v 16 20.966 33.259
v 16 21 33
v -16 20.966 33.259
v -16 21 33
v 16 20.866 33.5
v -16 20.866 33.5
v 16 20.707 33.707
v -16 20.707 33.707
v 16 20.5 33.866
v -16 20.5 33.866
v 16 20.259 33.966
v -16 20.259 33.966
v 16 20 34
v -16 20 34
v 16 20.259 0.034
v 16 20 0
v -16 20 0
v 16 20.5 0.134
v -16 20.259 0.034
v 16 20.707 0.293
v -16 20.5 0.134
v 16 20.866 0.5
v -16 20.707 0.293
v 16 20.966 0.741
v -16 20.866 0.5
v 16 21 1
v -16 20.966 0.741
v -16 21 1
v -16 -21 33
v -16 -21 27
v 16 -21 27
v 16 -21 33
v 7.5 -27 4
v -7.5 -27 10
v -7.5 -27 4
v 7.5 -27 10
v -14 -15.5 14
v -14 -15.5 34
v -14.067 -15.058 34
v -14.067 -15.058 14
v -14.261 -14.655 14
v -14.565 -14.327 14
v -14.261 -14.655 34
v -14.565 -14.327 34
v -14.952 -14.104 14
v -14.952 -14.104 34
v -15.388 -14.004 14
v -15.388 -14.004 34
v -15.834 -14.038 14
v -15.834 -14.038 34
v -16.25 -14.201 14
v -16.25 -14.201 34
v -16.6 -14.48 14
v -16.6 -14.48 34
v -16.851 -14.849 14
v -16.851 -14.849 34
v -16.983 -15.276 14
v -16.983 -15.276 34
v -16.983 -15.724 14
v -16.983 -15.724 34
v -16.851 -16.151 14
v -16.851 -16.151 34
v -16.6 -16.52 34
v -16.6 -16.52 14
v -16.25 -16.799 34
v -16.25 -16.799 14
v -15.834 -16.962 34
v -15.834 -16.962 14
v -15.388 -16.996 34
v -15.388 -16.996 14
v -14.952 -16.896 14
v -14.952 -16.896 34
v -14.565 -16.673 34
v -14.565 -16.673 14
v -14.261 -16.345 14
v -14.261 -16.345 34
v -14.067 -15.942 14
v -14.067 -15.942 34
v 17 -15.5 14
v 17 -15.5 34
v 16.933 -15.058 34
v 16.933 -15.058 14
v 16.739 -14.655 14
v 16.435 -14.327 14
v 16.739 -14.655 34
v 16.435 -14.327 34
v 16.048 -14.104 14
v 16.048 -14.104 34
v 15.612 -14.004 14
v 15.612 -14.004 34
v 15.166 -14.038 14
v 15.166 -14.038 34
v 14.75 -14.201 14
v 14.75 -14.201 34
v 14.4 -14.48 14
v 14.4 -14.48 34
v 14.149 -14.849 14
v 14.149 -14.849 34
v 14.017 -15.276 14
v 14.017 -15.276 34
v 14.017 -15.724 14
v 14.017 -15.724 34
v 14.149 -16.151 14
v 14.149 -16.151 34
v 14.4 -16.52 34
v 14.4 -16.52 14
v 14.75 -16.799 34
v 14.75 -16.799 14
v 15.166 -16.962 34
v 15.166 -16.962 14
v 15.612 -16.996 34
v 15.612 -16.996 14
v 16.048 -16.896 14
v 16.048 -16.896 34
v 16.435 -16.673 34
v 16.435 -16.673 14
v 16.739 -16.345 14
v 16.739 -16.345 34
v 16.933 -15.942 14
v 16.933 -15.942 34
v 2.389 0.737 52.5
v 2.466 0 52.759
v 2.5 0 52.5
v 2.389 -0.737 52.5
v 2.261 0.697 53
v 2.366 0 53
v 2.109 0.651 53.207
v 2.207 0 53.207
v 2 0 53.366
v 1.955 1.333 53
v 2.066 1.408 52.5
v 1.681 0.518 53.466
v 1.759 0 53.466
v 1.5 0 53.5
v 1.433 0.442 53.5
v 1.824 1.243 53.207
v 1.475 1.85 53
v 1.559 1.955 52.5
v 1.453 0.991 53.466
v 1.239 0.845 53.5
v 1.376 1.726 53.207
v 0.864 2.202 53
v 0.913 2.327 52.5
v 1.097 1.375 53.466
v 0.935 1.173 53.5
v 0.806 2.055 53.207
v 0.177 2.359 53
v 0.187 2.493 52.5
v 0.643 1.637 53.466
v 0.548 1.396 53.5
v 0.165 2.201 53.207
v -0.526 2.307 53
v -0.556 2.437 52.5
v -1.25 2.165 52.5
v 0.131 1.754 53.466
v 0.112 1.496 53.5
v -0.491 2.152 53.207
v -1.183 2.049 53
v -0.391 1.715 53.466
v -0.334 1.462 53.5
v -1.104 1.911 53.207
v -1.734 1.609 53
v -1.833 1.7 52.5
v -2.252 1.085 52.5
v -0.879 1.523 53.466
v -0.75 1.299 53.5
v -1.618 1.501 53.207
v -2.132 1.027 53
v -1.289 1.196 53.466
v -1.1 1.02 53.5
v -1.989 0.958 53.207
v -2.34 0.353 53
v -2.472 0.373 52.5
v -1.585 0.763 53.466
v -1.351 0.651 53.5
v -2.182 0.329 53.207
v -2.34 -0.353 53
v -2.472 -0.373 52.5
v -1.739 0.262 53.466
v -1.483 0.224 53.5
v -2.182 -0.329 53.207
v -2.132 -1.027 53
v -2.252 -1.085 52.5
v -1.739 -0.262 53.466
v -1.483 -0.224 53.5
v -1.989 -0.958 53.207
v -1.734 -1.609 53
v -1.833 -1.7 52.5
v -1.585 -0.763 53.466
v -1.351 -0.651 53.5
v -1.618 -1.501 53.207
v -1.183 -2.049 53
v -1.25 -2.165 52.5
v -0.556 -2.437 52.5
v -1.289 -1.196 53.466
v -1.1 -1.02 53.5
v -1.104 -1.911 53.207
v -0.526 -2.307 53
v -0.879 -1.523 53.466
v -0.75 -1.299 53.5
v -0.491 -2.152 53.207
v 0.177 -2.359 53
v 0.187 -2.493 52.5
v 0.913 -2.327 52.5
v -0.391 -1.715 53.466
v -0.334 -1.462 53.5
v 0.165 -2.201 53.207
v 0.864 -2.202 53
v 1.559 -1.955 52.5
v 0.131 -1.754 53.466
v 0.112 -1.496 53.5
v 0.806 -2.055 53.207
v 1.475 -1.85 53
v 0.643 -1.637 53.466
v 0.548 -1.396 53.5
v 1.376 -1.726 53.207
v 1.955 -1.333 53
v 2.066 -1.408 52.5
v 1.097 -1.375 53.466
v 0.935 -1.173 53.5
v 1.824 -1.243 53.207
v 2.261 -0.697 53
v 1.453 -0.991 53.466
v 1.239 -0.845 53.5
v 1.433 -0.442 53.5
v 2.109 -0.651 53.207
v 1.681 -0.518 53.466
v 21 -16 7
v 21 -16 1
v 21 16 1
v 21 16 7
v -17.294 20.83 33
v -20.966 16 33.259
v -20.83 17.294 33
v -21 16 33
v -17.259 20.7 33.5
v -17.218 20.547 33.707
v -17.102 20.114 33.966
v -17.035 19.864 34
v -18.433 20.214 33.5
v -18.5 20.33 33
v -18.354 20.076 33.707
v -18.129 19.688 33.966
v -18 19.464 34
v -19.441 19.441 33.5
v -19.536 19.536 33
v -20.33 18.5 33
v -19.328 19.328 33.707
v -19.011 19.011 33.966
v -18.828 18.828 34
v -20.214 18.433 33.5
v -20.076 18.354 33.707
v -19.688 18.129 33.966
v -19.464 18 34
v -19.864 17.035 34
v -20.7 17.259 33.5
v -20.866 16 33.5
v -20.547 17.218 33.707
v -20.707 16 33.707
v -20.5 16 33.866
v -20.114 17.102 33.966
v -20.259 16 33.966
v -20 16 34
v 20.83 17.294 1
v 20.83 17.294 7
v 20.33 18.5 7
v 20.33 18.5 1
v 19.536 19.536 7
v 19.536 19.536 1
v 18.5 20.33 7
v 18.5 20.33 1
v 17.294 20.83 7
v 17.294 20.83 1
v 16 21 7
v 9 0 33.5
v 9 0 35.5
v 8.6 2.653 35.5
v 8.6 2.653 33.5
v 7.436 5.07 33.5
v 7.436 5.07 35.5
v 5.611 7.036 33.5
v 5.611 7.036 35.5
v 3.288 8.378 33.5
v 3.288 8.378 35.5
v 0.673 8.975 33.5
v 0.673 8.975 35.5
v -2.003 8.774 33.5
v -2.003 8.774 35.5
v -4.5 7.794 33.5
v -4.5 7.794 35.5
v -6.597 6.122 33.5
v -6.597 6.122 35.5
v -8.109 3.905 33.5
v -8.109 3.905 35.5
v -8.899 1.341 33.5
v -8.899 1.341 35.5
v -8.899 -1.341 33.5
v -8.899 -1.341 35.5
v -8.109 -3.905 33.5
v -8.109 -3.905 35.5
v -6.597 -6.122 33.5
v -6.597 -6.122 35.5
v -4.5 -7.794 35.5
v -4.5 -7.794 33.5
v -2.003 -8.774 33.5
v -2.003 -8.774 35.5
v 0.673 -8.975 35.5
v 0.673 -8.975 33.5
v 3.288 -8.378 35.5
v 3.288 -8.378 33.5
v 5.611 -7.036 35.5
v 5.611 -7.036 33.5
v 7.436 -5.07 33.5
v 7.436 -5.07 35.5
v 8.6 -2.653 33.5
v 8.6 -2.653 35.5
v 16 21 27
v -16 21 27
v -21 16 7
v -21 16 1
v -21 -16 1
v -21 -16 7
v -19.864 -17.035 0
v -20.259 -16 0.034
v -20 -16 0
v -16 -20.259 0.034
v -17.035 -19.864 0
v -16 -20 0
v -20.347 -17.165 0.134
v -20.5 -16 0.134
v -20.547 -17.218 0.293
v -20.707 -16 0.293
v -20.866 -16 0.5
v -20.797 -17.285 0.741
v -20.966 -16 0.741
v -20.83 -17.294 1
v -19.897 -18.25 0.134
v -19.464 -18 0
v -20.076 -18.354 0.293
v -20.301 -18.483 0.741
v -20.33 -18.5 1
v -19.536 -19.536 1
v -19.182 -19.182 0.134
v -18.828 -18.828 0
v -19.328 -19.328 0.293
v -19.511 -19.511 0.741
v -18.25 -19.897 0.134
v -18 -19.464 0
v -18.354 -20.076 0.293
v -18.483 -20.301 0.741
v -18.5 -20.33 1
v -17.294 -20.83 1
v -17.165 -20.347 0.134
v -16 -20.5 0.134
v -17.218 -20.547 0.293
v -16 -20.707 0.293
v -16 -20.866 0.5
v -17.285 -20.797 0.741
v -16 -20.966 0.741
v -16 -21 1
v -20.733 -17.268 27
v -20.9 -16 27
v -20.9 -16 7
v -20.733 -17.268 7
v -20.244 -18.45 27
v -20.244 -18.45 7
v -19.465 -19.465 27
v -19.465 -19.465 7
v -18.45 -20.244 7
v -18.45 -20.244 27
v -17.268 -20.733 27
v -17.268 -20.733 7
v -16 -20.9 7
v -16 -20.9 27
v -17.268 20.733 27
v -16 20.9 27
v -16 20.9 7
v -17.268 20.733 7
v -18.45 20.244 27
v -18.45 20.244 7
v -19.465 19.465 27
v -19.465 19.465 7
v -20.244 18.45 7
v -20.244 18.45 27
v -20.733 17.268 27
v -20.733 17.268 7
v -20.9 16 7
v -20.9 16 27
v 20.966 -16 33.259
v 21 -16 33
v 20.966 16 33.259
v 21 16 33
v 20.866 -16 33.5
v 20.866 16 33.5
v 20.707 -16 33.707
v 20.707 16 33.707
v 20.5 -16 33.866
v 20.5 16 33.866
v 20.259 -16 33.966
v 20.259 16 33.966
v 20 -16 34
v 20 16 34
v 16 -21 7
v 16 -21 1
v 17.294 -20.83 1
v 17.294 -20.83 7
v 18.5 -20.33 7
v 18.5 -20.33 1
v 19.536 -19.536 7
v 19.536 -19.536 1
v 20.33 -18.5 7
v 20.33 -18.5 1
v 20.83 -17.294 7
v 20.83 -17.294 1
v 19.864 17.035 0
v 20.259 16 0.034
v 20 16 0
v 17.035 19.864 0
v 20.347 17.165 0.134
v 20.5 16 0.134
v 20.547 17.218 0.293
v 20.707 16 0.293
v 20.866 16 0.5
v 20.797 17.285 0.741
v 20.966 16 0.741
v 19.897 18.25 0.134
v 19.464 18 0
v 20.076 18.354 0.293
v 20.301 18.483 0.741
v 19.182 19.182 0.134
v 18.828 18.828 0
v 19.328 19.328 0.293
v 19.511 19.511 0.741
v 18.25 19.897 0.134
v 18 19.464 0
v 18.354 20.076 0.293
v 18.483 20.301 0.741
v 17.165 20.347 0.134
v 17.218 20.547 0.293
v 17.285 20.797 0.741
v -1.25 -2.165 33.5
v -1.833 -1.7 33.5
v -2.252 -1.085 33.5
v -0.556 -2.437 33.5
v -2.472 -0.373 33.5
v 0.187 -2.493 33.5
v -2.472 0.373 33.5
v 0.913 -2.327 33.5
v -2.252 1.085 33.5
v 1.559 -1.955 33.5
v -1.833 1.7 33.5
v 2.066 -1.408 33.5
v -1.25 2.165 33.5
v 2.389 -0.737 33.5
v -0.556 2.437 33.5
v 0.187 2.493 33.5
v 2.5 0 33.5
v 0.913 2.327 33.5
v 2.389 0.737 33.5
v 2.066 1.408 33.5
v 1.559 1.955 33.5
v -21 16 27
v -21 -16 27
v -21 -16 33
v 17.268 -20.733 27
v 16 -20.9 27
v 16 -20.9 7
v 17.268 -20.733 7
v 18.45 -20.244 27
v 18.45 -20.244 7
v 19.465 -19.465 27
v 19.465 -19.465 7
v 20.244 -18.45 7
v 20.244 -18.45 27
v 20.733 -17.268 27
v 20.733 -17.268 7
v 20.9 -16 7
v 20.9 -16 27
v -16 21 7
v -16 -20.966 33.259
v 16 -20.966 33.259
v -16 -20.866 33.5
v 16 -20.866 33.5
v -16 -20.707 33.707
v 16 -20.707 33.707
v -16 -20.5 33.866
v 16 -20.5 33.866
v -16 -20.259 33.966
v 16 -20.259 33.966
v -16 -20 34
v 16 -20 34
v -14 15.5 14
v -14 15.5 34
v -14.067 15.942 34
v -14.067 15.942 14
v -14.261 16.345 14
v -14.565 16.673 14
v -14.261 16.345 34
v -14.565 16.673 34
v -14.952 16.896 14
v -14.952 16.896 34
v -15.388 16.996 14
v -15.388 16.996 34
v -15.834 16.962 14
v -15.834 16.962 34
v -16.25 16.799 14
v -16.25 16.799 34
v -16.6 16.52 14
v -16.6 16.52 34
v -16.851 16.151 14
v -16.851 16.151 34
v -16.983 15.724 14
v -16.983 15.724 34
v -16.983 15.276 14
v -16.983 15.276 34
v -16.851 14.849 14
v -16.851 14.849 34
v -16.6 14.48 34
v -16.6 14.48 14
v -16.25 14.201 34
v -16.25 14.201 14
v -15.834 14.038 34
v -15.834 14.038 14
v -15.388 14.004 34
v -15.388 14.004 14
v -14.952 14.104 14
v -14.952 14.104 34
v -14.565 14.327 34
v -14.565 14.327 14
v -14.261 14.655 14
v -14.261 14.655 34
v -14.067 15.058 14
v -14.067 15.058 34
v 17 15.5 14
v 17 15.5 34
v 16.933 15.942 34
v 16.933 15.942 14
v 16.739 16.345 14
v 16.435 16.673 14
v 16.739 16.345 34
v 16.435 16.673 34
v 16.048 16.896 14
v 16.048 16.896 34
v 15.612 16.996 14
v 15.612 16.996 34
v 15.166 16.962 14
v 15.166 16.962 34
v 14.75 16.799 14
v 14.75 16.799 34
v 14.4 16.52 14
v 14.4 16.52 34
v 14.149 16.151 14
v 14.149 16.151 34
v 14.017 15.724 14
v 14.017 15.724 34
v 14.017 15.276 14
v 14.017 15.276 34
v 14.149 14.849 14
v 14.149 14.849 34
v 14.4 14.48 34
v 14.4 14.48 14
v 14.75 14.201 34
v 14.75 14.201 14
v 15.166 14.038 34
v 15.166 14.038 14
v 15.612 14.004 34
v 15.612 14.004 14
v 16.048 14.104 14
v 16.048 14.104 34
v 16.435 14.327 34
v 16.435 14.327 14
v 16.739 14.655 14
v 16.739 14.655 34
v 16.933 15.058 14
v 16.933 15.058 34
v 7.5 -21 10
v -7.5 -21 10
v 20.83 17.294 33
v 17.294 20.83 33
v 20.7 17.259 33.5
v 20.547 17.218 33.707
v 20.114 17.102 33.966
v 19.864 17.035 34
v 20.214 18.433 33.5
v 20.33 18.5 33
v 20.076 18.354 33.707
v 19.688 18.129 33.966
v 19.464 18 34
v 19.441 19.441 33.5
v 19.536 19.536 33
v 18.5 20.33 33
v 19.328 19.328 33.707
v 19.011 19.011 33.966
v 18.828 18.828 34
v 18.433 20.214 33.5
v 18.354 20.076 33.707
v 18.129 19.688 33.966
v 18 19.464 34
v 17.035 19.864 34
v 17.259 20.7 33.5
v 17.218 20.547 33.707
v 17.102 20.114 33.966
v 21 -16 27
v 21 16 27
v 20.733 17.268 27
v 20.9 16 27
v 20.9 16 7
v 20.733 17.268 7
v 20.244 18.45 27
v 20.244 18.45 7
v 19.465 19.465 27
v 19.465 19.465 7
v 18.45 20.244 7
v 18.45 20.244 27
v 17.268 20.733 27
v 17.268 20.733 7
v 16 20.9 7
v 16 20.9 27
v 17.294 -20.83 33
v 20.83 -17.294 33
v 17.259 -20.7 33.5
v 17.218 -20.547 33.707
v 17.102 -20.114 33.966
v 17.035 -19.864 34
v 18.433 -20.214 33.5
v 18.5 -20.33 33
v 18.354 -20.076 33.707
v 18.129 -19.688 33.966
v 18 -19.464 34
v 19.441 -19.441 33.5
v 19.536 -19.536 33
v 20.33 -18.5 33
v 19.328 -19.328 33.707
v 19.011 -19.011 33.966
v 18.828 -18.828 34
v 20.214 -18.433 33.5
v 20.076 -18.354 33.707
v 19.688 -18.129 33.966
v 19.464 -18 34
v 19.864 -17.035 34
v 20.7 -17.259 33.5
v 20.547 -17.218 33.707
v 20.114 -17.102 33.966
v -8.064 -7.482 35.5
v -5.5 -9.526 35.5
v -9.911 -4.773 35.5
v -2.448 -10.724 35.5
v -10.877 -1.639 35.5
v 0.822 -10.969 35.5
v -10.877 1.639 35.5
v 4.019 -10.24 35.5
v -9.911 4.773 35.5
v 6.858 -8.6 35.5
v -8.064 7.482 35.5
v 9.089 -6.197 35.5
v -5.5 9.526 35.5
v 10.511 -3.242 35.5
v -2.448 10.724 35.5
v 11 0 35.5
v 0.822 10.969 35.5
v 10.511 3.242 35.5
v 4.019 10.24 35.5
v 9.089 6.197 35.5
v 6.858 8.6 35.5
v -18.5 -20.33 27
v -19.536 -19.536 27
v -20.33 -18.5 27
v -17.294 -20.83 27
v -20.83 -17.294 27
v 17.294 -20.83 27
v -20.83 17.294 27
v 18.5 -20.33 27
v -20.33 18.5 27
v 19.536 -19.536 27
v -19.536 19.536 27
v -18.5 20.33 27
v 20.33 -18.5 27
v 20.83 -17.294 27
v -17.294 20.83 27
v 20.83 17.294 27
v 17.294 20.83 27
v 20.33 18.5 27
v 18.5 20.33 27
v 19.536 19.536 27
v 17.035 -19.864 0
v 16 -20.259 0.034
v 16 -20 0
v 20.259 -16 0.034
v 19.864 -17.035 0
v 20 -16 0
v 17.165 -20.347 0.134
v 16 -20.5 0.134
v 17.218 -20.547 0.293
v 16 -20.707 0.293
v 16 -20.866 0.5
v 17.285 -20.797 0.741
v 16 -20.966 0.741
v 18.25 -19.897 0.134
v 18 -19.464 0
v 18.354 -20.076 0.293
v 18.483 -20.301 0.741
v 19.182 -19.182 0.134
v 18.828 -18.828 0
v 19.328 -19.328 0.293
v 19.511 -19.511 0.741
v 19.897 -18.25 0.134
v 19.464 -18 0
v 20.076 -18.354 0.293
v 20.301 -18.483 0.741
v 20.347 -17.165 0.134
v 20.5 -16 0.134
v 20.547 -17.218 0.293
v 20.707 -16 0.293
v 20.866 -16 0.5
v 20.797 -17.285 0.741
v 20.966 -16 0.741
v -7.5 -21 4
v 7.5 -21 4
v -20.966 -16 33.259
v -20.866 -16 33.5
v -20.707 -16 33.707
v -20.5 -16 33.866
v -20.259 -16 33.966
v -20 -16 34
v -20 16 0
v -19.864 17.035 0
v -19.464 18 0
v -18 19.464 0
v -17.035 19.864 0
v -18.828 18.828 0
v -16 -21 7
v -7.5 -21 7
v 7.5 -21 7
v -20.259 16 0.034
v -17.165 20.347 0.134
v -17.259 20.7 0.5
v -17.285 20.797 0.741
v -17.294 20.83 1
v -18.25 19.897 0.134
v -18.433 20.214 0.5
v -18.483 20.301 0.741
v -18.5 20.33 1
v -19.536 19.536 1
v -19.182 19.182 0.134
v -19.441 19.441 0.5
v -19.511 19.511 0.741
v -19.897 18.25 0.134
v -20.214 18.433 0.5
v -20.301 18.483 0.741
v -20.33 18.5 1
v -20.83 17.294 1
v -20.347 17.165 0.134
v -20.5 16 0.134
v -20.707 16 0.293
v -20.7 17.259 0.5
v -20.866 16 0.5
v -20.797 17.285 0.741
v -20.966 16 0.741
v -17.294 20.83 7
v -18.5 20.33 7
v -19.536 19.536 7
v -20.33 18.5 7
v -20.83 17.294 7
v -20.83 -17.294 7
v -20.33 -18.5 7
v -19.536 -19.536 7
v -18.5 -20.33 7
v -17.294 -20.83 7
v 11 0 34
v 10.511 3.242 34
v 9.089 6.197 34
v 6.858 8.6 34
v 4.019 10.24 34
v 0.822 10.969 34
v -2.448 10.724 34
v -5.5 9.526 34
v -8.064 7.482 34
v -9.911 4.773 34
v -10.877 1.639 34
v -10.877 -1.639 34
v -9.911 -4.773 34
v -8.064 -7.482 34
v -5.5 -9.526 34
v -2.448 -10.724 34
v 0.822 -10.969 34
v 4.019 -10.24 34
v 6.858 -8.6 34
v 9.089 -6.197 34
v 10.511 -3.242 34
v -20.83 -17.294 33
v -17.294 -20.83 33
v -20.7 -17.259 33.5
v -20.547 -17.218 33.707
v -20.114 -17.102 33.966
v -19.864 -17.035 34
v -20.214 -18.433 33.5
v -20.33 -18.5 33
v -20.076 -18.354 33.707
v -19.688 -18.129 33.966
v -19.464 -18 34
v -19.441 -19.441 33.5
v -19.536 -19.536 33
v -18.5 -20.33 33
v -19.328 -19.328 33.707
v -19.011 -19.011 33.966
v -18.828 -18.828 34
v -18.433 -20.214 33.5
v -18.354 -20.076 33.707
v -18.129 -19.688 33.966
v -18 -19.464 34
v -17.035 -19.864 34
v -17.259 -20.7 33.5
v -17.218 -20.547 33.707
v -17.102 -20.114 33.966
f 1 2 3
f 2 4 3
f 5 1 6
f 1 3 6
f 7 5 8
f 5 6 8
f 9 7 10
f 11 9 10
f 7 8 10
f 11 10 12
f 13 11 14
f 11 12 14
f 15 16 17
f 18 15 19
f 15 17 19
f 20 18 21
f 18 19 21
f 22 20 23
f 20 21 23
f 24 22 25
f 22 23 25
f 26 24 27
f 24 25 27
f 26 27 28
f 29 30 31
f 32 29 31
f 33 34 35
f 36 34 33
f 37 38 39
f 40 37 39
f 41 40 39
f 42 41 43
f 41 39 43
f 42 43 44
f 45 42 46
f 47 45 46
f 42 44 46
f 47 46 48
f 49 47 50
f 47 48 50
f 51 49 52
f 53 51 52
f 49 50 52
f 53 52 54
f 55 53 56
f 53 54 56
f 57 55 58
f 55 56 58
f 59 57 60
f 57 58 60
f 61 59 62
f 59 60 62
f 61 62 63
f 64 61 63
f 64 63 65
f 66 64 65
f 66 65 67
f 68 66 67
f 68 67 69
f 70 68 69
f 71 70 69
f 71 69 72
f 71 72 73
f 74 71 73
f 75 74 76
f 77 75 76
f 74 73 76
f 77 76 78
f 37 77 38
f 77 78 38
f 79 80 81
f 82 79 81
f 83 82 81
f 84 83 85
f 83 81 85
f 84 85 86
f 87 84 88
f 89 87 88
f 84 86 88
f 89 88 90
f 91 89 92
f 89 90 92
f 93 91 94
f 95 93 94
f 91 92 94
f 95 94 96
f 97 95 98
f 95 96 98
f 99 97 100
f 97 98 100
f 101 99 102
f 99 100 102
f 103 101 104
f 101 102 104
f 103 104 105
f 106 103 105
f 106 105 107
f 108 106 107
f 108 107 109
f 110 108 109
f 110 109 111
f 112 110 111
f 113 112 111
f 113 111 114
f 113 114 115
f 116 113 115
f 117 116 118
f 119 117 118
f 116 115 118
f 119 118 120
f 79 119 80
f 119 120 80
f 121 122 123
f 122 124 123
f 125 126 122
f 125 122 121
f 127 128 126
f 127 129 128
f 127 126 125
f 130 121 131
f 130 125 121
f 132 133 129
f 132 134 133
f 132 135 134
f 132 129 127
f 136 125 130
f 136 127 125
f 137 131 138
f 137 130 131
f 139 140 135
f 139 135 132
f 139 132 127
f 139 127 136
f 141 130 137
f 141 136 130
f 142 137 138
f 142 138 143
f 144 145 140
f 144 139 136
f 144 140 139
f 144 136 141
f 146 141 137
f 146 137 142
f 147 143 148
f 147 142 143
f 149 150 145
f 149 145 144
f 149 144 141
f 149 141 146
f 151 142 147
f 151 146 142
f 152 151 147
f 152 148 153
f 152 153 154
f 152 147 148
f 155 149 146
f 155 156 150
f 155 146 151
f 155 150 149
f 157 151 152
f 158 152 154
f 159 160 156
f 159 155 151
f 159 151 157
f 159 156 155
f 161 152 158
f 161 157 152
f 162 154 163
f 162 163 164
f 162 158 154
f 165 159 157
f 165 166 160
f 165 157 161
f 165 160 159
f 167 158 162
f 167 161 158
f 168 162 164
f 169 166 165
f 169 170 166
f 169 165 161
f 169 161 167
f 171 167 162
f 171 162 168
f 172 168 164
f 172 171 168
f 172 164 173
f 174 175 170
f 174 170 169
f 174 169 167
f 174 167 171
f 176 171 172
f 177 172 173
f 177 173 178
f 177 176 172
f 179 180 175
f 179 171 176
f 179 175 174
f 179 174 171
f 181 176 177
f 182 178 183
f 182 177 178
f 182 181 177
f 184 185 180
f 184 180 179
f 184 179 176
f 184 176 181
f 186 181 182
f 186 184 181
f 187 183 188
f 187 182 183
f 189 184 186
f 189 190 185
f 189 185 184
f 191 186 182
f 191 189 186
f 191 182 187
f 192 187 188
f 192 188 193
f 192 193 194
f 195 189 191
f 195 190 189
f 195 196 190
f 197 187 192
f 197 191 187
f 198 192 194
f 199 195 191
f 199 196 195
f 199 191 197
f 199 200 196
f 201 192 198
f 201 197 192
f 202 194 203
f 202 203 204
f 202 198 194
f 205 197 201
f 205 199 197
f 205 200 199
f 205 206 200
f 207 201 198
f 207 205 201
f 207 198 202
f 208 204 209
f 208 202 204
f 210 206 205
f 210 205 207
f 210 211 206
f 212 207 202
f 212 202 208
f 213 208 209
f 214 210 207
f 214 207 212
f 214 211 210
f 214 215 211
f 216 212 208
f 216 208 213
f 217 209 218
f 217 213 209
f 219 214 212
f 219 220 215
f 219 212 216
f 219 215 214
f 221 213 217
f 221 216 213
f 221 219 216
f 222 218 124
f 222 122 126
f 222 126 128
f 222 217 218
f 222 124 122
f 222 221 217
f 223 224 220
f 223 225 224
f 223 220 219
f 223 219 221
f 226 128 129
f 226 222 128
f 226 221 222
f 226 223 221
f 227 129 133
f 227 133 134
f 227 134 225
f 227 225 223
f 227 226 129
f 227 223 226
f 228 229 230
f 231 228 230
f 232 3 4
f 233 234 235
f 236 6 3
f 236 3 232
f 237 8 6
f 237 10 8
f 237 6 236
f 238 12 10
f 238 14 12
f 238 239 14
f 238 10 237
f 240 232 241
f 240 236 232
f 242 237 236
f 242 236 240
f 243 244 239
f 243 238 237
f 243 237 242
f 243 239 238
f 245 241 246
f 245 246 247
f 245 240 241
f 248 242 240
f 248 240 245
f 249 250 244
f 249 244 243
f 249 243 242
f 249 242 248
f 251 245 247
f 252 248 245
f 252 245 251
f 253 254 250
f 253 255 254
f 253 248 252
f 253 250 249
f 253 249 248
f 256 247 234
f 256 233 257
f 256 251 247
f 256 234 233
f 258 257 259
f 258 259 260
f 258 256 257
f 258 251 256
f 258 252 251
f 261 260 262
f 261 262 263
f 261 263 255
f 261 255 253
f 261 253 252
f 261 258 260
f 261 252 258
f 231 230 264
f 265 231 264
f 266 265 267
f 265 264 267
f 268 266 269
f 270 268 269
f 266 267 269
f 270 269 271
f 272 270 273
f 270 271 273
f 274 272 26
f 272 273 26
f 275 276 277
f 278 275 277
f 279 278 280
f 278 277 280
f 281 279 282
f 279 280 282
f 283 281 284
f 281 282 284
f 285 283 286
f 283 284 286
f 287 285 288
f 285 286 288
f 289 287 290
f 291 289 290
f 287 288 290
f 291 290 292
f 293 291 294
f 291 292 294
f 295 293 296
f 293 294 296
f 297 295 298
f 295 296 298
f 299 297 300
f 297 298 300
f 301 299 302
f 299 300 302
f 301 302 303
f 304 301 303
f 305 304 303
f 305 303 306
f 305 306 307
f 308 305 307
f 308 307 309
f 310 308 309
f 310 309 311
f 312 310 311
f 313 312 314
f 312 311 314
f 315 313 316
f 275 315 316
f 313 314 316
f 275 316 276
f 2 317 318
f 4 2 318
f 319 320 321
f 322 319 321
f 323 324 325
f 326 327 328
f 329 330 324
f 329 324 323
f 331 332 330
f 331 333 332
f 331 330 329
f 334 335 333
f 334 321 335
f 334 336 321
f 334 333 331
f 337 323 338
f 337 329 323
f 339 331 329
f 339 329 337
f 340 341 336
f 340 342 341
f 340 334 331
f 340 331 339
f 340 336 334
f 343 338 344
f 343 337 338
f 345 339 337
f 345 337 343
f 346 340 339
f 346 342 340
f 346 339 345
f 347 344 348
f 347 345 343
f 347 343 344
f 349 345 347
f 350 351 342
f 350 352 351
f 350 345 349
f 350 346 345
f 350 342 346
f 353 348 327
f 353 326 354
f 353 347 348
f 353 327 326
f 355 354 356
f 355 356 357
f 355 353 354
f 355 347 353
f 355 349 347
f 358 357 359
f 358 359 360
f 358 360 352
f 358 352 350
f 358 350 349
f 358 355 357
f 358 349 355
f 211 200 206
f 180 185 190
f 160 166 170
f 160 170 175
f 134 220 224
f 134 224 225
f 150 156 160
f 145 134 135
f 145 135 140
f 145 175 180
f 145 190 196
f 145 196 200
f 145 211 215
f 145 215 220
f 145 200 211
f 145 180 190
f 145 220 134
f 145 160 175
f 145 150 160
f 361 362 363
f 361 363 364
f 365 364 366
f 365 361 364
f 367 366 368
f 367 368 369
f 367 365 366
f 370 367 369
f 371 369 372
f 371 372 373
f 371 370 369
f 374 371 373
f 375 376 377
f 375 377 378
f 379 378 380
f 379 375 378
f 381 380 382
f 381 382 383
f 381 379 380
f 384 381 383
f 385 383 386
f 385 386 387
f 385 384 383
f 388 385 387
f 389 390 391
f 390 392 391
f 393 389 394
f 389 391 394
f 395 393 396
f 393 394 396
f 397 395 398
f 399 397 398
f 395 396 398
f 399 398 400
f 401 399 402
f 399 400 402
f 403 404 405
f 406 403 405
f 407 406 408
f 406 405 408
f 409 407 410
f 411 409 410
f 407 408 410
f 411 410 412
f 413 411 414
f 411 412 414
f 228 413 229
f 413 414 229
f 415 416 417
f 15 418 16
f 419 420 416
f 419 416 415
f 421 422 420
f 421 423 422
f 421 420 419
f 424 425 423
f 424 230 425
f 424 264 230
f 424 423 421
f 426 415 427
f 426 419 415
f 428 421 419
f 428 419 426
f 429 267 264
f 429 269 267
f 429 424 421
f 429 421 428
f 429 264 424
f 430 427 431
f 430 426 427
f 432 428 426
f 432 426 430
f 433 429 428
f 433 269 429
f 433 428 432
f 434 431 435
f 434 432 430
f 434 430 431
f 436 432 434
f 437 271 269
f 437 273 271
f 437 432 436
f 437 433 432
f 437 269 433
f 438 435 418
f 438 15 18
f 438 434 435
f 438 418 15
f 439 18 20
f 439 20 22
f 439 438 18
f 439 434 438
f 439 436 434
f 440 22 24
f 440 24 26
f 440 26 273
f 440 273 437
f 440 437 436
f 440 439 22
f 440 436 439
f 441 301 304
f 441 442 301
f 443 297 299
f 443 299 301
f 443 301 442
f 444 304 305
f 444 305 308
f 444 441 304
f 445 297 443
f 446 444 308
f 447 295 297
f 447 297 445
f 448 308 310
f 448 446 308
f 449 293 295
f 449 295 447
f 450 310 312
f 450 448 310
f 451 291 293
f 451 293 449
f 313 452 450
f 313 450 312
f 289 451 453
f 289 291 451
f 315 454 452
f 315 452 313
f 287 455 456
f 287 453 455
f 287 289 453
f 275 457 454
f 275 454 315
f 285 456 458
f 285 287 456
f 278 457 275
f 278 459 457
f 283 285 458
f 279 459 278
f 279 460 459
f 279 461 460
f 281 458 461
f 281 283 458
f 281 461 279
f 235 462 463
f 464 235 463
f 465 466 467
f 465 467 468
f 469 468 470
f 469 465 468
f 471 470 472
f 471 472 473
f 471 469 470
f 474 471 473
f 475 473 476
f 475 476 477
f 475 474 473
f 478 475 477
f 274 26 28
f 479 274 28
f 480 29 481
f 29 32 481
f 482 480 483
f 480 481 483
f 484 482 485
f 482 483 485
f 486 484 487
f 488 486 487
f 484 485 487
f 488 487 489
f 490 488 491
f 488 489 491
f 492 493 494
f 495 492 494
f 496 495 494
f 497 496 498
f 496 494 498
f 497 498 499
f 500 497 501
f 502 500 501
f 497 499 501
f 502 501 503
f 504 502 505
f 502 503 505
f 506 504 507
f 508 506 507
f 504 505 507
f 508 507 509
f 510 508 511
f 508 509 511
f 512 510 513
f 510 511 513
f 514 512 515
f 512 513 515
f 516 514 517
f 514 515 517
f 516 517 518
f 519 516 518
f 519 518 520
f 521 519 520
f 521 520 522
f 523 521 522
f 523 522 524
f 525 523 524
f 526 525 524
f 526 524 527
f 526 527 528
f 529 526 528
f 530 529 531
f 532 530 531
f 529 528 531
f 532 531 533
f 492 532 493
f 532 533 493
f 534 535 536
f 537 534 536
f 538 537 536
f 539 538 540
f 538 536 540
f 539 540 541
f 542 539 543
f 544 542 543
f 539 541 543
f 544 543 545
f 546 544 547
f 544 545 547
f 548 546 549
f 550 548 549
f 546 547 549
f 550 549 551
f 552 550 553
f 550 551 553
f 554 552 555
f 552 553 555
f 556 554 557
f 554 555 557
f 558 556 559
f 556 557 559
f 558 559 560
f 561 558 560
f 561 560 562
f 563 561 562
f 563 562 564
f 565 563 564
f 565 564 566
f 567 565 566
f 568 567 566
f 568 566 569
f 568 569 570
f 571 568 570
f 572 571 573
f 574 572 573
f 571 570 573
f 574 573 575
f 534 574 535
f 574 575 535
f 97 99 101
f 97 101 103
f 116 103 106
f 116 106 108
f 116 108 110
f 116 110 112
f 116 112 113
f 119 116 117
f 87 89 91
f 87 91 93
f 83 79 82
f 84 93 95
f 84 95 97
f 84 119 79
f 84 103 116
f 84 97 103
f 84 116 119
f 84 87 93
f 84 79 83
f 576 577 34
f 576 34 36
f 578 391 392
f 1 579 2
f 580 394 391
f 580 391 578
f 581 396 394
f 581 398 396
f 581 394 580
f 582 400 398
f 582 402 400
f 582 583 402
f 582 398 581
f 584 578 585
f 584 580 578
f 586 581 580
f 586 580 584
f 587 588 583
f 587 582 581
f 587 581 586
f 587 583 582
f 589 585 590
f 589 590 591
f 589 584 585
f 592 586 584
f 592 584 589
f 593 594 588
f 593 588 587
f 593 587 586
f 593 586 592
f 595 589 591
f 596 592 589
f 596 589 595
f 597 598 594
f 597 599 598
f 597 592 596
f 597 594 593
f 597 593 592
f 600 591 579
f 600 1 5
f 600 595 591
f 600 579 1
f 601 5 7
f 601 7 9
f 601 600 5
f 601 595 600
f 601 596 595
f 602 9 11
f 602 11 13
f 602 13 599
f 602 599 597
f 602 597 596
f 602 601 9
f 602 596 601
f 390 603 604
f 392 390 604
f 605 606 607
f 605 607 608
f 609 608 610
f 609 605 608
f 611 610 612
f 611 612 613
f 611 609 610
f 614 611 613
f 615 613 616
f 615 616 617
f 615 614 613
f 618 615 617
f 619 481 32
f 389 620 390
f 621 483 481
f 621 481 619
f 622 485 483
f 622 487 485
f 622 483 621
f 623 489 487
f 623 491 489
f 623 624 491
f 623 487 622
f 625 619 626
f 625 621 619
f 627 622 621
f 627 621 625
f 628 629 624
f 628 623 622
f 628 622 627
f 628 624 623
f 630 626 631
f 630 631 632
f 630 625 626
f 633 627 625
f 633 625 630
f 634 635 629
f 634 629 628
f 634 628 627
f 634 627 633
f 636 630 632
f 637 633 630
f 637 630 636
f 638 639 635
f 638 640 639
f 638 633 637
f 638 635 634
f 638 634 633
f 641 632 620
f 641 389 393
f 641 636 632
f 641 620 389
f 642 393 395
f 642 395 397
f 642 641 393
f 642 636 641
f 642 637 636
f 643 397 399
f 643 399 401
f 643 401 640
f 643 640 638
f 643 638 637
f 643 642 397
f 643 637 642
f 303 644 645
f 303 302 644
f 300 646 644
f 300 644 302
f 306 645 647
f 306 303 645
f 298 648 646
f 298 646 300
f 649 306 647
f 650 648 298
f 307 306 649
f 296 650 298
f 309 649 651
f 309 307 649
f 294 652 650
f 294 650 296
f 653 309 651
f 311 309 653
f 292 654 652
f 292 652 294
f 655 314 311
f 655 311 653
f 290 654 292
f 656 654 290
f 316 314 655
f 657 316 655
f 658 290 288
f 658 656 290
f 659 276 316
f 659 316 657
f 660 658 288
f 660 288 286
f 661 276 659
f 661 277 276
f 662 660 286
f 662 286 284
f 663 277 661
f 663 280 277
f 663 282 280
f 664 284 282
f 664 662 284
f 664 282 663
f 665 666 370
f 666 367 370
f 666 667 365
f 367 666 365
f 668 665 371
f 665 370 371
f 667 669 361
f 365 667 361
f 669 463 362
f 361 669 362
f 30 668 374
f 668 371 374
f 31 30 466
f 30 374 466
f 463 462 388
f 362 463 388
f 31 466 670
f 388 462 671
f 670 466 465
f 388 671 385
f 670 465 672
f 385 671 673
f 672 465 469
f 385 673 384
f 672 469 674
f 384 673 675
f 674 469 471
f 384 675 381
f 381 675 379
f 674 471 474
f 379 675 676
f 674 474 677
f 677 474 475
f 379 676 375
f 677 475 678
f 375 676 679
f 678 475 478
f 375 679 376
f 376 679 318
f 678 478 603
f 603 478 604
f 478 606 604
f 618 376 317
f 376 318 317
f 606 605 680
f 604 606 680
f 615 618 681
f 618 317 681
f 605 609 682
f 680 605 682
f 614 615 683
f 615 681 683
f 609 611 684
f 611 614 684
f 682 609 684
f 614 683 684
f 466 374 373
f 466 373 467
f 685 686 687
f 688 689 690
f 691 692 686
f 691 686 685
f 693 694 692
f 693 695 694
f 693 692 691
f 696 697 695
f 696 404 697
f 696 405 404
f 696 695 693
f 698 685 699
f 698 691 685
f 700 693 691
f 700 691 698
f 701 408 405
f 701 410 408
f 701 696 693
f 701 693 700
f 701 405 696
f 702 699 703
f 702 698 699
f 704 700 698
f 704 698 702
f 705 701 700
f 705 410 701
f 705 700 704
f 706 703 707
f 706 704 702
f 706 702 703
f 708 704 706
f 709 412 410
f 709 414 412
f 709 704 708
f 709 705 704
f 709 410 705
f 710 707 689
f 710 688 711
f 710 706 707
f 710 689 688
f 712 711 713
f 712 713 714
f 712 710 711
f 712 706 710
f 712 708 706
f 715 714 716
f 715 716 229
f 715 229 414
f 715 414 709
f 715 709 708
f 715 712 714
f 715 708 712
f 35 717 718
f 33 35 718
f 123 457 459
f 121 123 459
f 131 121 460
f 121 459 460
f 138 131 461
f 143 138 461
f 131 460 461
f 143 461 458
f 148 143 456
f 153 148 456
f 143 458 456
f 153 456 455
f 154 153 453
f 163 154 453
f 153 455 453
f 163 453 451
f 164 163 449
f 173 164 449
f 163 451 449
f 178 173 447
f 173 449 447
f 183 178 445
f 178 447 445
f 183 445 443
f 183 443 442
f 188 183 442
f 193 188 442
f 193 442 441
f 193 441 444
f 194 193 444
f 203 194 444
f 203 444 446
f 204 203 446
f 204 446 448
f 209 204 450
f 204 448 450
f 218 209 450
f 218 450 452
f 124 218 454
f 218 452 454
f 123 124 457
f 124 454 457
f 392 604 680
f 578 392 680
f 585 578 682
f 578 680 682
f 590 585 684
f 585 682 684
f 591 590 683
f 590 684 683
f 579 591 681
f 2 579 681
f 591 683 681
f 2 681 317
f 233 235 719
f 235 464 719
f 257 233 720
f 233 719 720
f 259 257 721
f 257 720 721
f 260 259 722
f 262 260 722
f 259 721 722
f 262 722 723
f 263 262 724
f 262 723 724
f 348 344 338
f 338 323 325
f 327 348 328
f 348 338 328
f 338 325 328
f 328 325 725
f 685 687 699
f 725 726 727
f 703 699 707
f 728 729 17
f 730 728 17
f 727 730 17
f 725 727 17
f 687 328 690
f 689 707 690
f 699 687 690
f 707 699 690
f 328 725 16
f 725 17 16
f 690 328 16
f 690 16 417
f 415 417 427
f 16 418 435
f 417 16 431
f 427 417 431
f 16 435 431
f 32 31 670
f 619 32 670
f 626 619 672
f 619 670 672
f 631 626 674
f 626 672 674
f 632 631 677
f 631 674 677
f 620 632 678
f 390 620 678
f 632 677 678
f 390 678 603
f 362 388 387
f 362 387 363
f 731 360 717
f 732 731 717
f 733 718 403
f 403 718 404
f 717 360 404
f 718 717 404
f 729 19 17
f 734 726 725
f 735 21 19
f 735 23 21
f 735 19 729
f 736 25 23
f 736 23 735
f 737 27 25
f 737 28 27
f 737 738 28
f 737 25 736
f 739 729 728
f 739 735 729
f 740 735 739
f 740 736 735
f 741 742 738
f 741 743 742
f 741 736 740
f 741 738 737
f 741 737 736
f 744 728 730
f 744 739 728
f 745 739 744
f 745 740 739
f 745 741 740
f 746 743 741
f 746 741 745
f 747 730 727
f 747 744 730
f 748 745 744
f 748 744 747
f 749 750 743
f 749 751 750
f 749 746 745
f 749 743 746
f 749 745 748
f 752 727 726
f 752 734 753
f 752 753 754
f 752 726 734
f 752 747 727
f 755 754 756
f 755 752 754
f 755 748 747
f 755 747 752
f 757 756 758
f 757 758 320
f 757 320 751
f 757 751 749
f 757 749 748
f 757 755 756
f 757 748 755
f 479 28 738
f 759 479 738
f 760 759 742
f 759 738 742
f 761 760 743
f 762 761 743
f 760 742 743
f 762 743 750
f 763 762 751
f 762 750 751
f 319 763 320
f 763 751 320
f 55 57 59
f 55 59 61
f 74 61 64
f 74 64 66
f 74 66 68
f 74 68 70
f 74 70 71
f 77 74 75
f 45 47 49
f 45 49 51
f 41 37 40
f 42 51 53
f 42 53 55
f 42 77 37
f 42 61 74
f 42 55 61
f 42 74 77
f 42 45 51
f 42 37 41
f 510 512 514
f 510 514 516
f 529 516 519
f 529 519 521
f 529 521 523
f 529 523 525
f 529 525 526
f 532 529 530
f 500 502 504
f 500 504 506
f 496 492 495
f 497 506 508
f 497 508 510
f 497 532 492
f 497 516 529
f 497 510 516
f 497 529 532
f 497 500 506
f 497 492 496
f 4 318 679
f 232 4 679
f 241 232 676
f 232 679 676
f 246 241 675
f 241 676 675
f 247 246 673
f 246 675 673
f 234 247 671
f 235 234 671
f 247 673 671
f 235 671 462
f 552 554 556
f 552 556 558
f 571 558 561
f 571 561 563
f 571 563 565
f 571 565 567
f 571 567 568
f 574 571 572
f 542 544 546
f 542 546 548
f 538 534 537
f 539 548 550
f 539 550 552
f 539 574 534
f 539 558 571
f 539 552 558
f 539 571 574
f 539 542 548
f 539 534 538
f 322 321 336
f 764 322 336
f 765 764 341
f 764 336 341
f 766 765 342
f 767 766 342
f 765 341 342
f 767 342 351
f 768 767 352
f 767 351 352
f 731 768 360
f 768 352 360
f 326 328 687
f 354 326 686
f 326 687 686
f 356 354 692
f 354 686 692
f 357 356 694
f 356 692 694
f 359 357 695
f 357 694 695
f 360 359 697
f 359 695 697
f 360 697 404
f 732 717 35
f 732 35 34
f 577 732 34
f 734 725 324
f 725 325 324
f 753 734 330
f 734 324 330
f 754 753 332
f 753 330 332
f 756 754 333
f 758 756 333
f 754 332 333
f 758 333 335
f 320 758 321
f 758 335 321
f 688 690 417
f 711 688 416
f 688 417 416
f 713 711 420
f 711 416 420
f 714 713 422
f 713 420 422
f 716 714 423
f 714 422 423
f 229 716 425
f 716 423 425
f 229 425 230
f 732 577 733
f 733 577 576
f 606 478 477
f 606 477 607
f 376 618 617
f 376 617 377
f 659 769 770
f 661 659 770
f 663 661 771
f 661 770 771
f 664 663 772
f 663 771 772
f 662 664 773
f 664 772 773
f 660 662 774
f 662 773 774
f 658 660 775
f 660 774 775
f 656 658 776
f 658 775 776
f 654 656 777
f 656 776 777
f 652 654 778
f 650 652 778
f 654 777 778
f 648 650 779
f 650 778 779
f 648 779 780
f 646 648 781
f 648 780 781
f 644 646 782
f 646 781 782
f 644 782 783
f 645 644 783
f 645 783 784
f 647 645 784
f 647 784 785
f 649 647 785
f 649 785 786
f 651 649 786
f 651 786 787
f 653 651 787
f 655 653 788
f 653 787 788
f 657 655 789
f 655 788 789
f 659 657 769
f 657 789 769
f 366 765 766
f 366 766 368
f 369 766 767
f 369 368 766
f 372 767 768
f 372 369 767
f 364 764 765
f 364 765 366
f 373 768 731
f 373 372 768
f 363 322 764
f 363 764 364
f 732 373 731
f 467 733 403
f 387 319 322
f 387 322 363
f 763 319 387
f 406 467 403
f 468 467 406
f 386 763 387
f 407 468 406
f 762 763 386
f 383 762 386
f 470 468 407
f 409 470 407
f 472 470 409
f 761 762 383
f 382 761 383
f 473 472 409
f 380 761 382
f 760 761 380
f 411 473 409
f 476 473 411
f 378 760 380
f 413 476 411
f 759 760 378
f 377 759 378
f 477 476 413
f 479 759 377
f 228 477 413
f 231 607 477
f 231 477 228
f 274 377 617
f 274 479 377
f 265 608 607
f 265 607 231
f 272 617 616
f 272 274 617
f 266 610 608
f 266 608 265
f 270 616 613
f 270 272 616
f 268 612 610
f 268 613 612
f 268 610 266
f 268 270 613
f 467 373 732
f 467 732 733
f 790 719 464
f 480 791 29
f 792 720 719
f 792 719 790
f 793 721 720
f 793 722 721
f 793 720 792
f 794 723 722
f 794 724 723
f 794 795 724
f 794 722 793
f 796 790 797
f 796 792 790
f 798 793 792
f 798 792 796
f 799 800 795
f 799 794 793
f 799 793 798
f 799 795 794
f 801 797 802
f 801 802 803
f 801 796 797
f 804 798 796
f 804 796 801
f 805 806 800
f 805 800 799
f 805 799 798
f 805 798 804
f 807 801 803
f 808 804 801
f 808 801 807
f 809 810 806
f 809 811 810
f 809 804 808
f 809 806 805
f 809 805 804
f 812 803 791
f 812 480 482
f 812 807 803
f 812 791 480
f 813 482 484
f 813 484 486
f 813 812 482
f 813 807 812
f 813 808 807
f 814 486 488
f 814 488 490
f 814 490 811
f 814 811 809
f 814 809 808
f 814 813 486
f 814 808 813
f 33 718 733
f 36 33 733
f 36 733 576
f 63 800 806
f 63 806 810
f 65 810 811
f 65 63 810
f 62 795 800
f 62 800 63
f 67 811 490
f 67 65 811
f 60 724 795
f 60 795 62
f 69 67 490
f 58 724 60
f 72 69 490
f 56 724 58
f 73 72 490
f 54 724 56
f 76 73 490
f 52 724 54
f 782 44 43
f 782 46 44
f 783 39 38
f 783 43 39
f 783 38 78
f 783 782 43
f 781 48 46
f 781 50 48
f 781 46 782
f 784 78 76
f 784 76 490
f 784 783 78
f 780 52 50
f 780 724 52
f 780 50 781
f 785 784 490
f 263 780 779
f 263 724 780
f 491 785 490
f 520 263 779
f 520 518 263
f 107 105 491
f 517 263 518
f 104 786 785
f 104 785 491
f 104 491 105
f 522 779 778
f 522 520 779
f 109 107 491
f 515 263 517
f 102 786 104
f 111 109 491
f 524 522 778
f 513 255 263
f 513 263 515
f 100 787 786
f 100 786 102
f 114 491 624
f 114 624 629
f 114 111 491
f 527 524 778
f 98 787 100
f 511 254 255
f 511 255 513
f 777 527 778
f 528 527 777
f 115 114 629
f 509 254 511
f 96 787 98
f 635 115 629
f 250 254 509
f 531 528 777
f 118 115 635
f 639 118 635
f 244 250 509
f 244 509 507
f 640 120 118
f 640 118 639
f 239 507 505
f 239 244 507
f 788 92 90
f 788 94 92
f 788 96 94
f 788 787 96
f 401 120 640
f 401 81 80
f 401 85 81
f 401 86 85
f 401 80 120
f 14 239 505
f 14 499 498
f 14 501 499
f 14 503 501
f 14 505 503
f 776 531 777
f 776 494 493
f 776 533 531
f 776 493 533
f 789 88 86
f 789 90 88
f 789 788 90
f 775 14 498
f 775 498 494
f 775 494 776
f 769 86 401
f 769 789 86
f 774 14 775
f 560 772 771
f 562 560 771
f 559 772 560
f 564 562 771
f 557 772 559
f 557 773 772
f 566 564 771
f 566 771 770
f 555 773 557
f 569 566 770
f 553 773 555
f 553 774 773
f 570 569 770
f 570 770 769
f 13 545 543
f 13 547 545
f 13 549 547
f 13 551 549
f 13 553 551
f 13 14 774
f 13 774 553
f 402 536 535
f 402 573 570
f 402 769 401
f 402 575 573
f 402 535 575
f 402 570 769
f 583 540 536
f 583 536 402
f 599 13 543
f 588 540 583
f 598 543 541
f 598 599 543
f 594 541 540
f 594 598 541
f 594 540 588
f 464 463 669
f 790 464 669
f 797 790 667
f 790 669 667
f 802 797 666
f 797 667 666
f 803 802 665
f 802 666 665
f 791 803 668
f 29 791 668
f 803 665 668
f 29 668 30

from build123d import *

# Parameters (mm, degrees)
BOSS_EXTRUDE1_DEPTH = 34
SKETCH4_R           = 11
BOSS_EXTRUDE2_DEPTH = 1.5
SKETCH5_W           = 15
SKETCH5_H           = 6
BOSS_EXTRUDE3_DEPTH = 6
SKETCH6_R           = 9
CUT_EXTRUDE1_DEPTH  = 2
SKETCH7_R           = 2.5
BOSS_EXTRUDE4_DEPTH = 20
CUT_EXTRUDE3_DEPTH  = 20
FILLET1_R           = 1
FILLET2_R           = 1
SKETCH9_R           = 1.5
CUT_EXTRUDE4_DEPTH  = 20


with BuildPart() as part:
    # Sketch2 → Boss-Extrude1 (new body)
    with BuildSketch(Plane.XY):
        with BuildLine():
            Line((-16, -21), (16, -21))
            ThreePointArc((16, -21), (19.535533906, -19.535533906), (21, -16))
            Line((21, -16), (21, 16))
            ThreePointArc((21, 16), (19.535533906, 19.535533906), (16, 21))
            Line((16, 21), (-16, 21))
            ThreePointArc((-16, 21), (-19.535533906, 19.535533906), (-21, 16))
            Line((-21, 16), (-21, -16))
            ThreePointArc((-21, -16), (-19.535533906, -19.535533906), (-16, -21))
        make_face()
    extrude(amount=BOSS_EXTRUDE1_DEPTH)

    # Sketch4 → Boss-Extrude2 (add)
    with BuildSketch(Plane.XY.offset(34)):
        Circle(SKETCH4_R)
    extrude(amount=BOSS_EXTRUDE2_DEPTH)

    # Sketch5 → Boss-Extrude3 (add)
    with BuildSketch(Plane.XZ.offset(21)):
        with Locations((0, 7)):
            Rectangle(SKETCH5_W, SKETCH5_H)
    extrude(amount=BOSS_EXTRUDE3_DEPTH)

    # Sketch6 → Cut-Extrude1 (cut)
    with BuildSketch(Plane.XY.offset(35.5)):
        Circle(SKETCH6_R)
    extrude(amount=-CUT_EXTRUDE1_DEPTH, mode=Mode.SUBTRACT)

    # Sketch7 → Boss-Extrude4 (add)
    with BuildSketch(Plane.XY.offset(33.5)):
        Circle(SKETCH7_R)
    extrude(amount=BOSS_EXTRUDE4_DEPTH)

    # Sketch8 → Cut-Extrude3 (cut)
    with BuildSketch(Plane.XY.offset(27)):
        with BuildLine():
            Line((16, 21), (-16, 21))
            ThreePointArc((-16, 21), (-19.535533906, 19.535533906), (-21, 16))
            Line((-21, 16), (-21, -16))
            ThreePointArc((-21, -16), (-19.535533906, -19.535533906), (-16, -21))
            Line((-16, -21), (16, -21))
            ThreePointArc((16, -21), (19.535533906, -19.535533906), (21, -16))
            Line((21, -16), (21, 16))
            ThreePointArc((21, 16), (19.535533906, 19.535533906), (16, 21))
        make_face()
        with BuildLine():
            Line((16, 20.9), (-16, 20.9))
            ThreePointArc((-16, 20.9), (-19.464823228, 19.464823228), (-20.9, 16))
            Line((-20.9, 16), (-20.9, -16))
            ThreePointArc((-20.9, -16), (-19.464823228, -19.464823228), (-16, -20.9))
            Line((-16, -20.9), (16, -20.9))
            ThreePointArc((16, -20.9), (19.464823228, -19.464823228), (20.9, -16))
            Line((20.9, -16), (20.9, 16))
            ThreePointArc((20.9, 16), (19.464823228, 19.464823228), (16, 20.9))
        make_face(mode=Mode.SUBTRACT)
    extrude(amount=-CUT_EXTRUDE3_DEPTH, mode=Mode.SUBTRACT)

    # Fillet1
    fillet1_edges = [part.edges().sort_by_distance(p)[0] for p in [
        (-21, 0, 0),
        (-19.535533906, 19.535533906, 0),
        (0, 21, 0),
        (19.535533906, 19.535533906, 0),
        (-19.535533906, 19.535533906, 34),
        (-21, 0, 34),
        (-19.535533906, -19.535533906, 34),
        (0, -21, 34),
        (19.535533906, -19.535533906, 34),
        (21, 0, 34),
        (19.535533906, 19.535533906, 34),
        (21, 0, 0),
        (0, 21, 34),
        (19.535533906, -19.535533906, 0),
        (0, -21, 0),
        (-19.535533906, -19.535533906, 0),
    ]]
    fillet(fillet1_edges, radius=FILLET1_R)

    # Fillet2
    fillet2_edges = [part.edges().sort_by_distance(p)[0] for p in [
        (-2.5, 0, 53.5),
    ]]
    fillet(fillet2_edges, radius=FILLET2_R)

    # Sketch9 → Cut-Extrude4 (cut)
    with BuildSketch(Plane.XY.offset(34)):
        with Locations((15.5, 15.5)):
            Circle(SKETCH9_R)
        with Locations((15.5, -15.5)):
            Circle(SKETCH9_R)
        with Locations((-15.5, -15.5)):
            Circle(SKETCH9_R)
        with Locations((-15.5, 15.5)):
            Circle(SKETCH9_R)
    extrude(amount=-CUT_EXTRUDE4_DEPTH, mode=Mode.SUBTRACT)


solid = part.part
